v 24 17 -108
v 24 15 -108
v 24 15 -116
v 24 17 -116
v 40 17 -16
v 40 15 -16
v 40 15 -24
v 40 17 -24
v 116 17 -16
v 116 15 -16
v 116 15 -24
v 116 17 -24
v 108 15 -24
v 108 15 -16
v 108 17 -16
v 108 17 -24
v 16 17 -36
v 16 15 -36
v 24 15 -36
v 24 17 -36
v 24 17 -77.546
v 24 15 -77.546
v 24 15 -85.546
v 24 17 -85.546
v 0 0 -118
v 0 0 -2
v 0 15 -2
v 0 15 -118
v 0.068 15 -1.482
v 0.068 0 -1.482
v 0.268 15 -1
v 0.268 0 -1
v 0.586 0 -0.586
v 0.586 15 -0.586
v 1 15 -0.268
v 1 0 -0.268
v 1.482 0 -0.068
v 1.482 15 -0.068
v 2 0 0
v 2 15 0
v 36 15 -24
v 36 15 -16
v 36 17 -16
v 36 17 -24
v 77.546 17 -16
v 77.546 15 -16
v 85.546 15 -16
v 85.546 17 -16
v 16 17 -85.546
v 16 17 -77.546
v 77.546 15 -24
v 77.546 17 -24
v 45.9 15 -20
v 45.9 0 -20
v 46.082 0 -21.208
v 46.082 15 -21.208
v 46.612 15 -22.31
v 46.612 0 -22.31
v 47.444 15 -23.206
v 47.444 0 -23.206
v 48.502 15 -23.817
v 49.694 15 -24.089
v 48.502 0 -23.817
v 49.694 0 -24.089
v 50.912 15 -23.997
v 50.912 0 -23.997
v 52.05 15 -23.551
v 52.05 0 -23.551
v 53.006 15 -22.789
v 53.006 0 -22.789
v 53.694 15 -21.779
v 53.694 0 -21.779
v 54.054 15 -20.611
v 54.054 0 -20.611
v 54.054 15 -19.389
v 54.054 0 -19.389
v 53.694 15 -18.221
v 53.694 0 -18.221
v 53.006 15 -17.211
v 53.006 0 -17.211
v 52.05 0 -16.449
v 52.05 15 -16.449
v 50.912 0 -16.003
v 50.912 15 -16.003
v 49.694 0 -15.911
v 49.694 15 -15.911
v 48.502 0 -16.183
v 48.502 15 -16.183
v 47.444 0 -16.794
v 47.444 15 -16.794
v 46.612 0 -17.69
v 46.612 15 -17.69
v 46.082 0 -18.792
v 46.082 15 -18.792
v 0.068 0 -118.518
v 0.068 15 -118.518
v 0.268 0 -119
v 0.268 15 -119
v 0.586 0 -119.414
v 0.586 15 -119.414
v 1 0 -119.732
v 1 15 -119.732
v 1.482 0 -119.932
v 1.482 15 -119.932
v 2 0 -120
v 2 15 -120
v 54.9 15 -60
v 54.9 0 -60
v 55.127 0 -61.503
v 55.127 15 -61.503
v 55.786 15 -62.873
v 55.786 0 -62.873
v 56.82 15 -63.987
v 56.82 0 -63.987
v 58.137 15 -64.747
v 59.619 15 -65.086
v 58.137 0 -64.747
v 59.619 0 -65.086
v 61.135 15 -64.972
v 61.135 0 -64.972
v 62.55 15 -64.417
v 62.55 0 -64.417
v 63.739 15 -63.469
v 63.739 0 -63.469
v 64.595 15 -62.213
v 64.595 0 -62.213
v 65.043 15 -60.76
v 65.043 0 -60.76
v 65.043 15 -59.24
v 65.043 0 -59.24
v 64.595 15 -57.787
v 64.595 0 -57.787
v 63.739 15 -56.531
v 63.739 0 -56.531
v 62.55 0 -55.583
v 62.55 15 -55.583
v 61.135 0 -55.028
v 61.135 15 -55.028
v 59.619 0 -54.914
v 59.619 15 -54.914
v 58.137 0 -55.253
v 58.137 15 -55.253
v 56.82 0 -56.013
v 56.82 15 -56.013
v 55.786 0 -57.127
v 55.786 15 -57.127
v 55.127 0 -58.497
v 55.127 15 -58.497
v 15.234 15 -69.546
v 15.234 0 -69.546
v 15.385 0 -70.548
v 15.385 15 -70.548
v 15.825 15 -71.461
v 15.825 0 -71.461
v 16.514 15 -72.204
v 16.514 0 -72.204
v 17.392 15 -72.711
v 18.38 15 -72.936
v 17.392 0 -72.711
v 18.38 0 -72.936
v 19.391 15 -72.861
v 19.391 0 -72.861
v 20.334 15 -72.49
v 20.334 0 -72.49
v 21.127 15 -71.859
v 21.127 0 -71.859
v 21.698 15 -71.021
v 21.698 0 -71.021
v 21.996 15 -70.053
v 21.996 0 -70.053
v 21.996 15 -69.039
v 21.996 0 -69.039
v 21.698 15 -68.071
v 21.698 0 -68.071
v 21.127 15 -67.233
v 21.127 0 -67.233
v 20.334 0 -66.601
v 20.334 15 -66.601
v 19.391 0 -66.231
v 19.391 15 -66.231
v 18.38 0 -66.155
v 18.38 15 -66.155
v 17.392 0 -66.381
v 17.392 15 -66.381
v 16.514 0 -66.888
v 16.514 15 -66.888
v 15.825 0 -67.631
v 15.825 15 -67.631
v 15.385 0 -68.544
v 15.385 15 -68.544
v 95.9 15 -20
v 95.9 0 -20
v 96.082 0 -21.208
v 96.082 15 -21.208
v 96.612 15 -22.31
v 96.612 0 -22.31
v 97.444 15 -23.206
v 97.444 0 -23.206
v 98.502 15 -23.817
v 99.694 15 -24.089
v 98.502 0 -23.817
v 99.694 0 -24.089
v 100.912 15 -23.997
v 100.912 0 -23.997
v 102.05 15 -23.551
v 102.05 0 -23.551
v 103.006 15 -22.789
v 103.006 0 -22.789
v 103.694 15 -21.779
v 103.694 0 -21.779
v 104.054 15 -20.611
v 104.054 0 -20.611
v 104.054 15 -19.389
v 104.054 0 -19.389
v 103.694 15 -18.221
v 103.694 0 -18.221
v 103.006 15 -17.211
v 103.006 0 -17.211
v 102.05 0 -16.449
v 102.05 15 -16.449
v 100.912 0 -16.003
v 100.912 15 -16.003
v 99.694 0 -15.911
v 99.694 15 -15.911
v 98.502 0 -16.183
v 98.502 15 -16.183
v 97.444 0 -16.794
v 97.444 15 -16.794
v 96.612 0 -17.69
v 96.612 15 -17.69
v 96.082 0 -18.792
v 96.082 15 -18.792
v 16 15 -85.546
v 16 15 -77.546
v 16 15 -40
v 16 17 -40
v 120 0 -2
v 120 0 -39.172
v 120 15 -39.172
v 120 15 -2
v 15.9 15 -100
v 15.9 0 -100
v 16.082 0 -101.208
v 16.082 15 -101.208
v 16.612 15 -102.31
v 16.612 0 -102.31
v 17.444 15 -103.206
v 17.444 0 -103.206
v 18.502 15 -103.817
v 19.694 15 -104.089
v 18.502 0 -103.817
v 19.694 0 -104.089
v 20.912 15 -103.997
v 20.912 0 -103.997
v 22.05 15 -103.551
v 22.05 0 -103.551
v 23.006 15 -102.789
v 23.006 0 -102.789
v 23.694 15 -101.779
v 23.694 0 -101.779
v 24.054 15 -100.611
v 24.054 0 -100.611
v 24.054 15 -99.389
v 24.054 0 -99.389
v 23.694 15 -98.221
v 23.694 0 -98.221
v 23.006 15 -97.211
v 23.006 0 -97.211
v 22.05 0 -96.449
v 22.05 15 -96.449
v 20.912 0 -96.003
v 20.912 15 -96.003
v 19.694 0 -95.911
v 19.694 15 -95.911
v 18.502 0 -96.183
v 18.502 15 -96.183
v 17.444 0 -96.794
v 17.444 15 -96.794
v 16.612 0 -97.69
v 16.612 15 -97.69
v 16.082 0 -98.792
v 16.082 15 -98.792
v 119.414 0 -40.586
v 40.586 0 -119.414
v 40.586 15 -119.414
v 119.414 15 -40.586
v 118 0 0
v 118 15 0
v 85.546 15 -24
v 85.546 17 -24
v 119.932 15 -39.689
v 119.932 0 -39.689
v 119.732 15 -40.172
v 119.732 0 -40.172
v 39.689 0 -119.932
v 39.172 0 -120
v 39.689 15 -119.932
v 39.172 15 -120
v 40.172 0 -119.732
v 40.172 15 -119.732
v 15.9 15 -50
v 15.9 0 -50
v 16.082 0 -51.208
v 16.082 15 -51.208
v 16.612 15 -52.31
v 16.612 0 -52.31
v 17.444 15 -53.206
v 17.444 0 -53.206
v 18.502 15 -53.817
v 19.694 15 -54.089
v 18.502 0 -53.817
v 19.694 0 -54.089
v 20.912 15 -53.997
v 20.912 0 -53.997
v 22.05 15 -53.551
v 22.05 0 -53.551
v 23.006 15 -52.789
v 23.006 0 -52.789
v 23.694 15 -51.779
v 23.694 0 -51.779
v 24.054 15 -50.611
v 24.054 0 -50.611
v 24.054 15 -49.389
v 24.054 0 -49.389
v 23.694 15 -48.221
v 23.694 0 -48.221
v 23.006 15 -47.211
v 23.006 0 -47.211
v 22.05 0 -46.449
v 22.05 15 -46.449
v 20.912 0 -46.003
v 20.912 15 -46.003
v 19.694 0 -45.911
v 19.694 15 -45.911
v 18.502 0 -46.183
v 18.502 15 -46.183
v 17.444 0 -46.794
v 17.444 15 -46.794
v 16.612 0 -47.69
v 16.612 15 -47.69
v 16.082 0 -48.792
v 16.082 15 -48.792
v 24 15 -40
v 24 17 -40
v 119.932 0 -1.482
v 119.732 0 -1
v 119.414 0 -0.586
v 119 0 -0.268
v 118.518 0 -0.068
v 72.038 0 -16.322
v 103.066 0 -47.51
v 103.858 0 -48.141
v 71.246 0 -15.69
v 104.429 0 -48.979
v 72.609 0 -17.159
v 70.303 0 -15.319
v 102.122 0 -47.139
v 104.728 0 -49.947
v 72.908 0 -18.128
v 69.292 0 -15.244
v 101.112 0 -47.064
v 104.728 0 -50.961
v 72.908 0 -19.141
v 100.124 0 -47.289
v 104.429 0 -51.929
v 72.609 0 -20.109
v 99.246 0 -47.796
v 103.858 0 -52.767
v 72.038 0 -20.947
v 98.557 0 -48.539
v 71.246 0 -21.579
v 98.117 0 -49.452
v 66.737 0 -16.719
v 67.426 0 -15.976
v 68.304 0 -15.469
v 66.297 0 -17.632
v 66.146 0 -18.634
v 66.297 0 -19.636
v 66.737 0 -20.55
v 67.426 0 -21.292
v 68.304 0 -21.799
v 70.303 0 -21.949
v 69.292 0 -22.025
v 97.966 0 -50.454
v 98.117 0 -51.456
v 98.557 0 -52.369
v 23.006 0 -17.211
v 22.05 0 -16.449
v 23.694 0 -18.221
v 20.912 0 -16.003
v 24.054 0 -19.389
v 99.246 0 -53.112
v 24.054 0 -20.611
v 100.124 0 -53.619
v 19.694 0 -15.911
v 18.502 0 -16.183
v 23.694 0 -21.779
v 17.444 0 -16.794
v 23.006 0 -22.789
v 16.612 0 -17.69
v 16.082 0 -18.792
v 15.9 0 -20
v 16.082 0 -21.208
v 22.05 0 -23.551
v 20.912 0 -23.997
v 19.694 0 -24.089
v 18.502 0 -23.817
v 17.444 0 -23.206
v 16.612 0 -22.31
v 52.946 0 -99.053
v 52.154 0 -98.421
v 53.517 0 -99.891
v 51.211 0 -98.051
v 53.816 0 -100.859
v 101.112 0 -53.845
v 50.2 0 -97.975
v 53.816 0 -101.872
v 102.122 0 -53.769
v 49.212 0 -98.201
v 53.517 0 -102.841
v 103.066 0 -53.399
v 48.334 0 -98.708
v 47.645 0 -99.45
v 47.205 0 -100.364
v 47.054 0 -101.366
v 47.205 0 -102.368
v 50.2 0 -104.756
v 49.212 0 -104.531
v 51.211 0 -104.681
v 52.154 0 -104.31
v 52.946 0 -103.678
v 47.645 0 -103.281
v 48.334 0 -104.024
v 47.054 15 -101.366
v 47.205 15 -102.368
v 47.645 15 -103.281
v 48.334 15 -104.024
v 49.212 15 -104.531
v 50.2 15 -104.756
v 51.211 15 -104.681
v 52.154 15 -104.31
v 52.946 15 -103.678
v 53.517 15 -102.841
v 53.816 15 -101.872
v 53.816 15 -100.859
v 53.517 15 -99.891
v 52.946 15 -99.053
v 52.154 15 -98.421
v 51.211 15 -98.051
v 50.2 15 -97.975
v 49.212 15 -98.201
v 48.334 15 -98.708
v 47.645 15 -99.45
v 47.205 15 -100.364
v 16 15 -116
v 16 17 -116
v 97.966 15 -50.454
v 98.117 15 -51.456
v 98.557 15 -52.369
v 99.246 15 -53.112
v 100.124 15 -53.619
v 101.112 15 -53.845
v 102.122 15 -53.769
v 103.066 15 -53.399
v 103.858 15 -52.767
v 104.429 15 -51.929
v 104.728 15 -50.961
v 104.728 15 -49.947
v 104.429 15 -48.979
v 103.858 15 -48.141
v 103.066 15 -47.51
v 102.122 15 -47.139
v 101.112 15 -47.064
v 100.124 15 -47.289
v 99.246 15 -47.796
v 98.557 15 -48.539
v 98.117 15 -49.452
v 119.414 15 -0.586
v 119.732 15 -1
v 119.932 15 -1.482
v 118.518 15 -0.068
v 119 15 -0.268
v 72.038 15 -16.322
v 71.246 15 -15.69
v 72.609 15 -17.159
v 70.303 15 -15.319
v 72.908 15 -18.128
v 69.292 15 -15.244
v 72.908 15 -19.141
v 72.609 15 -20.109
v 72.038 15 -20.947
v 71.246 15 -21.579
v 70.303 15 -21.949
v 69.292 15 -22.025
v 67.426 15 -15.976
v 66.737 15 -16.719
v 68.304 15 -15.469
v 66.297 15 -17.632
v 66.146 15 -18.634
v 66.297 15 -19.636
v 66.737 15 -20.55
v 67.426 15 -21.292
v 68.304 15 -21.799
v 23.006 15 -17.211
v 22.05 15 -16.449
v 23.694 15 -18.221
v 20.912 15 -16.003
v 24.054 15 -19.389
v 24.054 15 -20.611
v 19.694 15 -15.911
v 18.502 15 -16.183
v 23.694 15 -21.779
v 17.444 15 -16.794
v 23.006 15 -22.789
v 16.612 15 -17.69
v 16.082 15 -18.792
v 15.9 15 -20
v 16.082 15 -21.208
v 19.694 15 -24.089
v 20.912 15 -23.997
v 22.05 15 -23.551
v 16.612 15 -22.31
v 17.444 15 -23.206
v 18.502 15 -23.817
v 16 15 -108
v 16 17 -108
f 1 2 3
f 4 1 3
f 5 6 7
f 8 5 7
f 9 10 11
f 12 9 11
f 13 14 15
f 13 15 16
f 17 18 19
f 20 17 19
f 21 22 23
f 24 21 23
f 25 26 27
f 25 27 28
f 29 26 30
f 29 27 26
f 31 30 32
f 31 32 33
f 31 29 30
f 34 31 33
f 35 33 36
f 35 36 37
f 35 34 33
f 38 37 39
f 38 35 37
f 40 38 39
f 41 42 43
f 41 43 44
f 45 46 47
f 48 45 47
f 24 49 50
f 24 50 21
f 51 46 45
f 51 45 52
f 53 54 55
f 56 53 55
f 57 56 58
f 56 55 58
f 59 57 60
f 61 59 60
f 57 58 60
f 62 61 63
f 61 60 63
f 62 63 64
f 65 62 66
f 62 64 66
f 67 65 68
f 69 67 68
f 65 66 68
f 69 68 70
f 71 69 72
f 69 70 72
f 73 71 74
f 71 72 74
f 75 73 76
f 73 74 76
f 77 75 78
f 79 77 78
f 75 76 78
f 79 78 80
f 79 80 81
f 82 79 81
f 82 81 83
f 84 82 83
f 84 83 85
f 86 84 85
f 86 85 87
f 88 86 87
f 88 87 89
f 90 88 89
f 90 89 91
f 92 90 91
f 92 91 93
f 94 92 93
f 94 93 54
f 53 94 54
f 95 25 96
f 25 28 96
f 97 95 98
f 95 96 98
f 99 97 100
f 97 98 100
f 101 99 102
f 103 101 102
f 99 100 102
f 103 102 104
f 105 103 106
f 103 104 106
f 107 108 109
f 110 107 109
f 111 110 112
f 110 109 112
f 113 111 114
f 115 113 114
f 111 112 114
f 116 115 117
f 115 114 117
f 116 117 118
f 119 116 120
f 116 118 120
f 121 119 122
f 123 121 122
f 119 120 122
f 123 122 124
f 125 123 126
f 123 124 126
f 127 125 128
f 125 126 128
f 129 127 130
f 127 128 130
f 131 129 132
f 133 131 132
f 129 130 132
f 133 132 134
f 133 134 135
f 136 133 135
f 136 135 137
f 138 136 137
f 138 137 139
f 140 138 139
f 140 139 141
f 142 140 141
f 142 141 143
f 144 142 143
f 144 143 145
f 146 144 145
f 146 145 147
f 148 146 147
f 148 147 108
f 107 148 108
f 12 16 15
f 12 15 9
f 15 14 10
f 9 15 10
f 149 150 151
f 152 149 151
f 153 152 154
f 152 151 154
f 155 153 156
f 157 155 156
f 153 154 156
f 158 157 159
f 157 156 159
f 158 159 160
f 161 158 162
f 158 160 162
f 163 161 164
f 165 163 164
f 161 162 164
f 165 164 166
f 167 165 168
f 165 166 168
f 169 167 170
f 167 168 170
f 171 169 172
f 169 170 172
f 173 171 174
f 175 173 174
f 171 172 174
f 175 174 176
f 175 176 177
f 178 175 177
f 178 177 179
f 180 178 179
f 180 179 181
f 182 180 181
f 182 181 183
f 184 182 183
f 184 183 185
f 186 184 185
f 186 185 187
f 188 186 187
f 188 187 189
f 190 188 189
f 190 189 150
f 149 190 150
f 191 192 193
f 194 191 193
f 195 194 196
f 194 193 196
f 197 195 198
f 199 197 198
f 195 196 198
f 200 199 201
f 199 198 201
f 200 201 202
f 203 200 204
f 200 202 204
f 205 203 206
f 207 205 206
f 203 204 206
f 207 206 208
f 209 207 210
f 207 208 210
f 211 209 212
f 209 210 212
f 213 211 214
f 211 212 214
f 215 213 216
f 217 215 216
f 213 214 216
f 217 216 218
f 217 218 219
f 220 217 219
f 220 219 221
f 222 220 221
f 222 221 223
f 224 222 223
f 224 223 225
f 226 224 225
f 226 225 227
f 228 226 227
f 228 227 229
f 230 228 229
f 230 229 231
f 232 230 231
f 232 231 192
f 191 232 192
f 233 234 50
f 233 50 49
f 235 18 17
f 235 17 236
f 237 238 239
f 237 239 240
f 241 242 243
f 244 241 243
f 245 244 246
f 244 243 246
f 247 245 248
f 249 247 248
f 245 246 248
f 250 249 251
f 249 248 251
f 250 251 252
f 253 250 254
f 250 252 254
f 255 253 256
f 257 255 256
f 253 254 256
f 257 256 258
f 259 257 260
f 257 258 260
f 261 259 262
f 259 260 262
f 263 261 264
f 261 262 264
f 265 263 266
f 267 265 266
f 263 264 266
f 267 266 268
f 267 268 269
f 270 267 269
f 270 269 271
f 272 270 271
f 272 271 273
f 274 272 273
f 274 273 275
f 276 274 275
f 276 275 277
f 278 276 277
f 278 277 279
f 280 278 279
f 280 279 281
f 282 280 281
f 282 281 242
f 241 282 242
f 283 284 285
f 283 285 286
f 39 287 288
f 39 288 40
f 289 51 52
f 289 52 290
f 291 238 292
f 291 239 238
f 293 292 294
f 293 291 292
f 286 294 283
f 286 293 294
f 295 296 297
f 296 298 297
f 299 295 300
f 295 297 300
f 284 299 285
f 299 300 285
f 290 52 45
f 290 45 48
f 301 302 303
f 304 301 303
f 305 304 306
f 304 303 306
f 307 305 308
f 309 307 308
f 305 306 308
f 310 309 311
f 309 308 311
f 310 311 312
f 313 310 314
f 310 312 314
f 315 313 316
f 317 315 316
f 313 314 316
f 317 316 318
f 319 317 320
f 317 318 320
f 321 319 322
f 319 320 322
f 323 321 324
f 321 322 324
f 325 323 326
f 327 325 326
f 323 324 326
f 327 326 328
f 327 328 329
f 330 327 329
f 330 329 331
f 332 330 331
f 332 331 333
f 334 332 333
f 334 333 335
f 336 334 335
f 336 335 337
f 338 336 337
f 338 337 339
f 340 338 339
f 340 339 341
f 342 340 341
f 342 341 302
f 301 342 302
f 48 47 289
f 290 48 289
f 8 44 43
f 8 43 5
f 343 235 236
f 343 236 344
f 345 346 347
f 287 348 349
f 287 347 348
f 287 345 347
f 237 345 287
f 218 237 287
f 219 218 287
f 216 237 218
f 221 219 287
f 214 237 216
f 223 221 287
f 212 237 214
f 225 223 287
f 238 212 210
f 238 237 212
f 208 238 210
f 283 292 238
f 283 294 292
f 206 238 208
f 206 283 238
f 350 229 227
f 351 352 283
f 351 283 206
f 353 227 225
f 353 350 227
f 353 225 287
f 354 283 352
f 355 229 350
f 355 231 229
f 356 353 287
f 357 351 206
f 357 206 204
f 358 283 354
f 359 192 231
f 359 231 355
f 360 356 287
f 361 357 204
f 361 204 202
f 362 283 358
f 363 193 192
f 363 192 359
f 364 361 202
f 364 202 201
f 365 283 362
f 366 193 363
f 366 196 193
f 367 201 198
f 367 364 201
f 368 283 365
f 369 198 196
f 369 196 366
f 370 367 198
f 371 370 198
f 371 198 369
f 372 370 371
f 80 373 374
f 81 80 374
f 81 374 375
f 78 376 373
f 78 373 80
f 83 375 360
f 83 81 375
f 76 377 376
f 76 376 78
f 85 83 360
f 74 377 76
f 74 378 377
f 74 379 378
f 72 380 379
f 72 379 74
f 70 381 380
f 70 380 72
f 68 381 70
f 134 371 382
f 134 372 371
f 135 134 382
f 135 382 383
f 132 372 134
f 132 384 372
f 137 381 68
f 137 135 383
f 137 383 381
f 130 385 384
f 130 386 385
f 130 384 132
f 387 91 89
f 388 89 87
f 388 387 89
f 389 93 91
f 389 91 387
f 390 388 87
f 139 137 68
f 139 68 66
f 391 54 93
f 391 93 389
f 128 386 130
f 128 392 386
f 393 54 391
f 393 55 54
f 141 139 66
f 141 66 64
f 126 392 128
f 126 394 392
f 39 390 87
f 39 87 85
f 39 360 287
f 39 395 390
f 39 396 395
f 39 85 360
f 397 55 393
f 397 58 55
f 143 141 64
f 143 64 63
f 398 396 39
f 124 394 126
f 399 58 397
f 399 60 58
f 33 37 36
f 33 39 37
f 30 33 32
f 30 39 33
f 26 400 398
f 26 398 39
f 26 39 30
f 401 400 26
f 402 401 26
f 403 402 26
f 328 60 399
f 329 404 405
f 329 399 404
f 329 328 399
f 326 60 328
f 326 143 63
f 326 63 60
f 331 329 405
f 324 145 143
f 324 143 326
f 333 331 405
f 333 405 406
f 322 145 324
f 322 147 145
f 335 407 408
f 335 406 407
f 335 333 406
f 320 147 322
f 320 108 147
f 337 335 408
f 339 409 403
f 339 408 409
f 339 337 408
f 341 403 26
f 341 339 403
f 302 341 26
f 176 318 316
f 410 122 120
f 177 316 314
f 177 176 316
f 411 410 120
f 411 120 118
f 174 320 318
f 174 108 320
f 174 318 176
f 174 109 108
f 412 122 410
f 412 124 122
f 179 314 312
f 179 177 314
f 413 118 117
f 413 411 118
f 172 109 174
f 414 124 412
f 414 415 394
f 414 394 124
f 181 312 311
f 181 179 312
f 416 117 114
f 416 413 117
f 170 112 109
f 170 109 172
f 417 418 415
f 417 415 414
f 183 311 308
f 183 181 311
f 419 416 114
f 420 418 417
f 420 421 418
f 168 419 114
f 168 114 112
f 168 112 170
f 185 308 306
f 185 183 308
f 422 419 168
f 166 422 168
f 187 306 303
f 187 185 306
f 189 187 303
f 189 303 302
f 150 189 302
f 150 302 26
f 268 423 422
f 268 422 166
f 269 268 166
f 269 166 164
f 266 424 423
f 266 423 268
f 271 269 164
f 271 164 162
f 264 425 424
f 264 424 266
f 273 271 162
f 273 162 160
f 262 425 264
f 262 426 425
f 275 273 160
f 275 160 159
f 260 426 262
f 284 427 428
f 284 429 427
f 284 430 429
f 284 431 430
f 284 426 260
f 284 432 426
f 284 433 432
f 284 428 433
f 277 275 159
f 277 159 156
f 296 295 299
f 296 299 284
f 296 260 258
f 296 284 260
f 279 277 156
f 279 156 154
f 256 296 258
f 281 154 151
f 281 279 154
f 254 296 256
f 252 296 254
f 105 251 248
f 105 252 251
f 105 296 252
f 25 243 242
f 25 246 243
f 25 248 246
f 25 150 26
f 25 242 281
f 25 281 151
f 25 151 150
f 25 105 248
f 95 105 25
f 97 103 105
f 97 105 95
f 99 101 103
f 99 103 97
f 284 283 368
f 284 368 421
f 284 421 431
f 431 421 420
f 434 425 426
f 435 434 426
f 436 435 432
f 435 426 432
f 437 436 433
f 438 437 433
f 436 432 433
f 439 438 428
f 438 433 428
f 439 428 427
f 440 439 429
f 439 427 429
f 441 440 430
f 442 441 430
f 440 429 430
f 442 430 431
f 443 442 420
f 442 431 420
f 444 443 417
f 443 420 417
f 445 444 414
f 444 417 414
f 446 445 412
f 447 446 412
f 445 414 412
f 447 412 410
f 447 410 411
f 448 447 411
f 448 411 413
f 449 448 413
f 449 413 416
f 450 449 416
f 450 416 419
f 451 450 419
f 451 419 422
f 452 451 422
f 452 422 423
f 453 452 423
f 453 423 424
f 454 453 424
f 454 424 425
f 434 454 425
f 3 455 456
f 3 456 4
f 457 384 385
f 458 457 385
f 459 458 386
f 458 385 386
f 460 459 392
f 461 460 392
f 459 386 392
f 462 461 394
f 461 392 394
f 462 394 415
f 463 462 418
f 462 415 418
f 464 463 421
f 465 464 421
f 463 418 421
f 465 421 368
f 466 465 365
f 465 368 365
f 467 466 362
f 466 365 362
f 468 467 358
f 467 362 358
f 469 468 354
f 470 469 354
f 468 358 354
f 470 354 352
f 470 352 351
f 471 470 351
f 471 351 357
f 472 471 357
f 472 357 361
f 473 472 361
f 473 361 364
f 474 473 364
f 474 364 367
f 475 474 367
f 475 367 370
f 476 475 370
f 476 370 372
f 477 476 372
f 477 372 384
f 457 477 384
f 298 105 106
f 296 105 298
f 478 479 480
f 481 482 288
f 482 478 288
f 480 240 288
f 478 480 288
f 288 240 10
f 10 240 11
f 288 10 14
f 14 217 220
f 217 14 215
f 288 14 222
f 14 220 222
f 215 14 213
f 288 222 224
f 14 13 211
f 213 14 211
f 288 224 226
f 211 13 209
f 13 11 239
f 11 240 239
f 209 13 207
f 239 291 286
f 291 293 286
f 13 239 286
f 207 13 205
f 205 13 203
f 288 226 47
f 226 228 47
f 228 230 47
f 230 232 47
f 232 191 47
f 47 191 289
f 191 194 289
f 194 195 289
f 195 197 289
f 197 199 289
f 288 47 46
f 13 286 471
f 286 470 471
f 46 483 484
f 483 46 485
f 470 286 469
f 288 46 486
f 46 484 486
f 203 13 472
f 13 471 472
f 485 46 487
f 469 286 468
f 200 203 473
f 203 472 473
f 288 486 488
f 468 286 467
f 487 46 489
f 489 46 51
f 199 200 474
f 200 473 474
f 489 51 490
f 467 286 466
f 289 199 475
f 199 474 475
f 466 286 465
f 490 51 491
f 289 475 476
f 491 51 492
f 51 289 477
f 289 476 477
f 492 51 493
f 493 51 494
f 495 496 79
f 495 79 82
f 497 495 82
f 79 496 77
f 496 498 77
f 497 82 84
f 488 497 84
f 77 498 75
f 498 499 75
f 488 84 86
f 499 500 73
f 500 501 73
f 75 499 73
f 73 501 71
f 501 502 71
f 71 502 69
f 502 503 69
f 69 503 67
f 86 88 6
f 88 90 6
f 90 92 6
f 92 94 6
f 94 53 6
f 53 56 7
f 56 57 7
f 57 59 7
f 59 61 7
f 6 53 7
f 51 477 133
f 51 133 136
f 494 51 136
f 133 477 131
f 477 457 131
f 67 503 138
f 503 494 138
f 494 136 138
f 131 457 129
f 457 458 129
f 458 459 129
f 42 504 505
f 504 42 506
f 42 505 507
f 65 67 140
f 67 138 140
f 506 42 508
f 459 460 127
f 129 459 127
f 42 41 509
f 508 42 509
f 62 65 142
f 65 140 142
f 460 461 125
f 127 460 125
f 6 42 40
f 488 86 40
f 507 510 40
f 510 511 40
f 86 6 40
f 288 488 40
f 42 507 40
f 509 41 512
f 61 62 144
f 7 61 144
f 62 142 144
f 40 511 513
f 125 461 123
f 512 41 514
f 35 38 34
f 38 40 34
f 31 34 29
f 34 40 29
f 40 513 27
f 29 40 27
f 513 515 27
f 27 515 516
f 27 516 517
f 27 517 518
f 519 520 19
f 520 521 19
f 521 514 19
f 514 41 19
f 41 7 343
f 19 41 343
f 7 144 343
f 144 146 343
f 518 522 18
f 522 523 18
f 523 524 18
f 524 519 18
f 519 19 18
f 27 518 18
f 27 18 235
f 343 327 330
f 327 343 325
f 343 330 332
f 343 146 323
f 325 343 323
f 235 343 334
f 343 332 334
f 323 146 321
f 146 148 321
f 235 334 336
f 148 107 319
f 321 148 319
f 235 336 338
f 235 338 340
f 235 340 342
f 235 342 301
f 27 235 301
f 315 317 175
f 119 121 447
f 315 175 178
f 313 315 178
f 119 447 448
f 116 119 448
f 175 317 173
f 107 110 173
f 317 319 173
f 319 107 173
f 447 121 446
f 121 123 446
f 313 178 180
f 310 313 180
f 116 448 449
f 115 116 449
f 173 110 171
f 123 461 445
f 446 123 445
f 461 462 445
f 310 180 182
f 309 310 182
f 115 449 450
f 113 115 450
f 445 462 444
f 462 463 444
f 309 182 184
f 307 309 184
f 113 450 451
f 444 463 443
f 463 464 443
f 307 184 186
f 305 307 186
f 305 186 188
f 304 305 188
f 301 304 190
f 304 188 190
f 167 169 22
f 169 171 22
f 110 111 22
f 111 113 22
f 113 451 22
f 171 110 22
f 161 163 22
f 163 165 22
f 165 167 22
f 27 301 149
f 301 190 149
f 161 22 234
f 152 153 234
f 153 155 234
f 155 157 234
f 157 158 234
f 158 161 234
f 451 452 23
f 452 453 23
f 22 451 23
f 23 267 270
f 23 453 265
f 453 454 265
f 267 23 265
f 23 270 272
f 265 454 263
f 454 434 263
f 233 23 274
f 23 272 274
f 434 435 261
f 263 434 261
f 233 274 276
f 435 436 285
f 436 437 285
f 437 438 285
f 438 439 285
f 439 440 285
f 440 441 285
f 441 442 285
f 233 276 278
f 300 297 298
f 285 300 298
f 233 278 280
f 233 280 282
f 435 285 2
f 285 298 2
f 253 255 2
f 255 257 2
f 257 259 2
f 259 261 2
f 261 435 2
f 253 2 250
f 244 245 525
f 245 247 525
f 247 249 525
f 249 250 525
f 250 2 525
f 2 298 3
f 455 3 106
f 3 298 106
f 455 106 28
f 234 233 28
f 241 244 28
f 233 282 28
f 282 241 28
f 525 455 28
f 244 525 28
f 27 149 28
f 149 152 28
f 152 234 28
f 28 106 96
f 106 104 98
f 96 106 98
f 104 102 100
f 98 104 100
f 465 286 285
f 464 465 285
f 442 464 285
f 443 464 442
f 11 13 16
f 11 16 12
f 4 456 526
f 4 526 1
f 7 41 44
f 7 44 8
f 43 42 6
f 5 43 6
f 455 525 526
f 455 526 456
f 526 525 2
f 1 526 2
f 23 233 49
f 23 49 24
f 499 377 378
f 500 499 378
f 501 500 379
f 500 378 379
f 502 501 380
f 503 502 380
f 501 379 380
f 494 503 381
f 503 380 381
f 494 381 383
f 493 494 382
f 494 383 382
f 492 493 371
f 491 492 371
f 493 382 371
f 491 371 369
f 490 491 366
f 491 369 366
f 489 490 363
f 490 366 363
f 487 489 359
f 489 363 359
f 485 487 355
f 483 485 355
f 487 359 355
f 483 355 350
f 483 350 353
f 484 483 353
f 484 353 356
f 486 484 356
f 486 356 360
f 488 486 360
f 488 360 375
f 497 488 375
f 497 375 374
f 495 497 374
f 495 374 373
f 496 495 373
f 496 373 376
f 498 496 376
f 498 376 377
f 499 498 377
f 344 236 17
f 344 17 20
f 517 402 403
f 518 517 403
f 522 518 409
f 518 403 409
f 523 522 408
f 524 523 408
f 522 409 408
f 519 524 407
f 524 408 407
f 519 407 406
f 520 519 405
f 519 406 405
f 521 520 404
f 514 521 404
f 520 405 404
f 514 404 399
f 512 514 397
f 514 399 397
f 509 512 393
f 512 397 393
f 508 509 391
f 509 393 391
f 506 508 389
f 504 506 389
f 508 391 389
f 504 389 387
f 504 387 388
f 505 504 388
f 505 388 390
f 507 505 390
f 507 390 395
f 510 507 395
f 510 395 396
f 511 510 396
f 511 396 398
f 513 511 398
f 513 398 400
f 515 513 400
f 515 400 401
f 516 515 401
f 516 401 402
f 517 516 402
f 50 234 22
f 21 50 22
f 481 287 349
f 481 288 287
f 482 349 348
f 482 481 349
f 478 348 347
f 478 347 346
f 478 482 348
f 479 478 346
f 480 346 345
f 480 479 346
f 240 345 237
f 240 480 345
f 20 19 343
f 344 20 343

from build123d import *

# Parameters (mm, degrees)
EXTRUDE_1_DEPTH             = 15
HOLE_WIZARD_M121_D          = 10.2
HOLE_WIZARD_M121_DEPTH      = 15
HOLE_WIZARD_M81_D           = 6.8
HOLE_WIZARD_M81_DEPTH       = 15
HOLE_WIZARD_8_2_8_2_1_D     = 8.2
HOLE_WIZARD_8_2_8_2_1_DEPTH = 15
SKETCH_9_W                  = 8
SKETCH_9_H                  = 8
SKETCH_9_H_2                = 4
SKETCH_9_W_2                = 4
EXTRUDE_2_DEPTH             = 2
FILLET_1_R                  = 2


with BuildPart() as part:
    # Эскиз1 → Бобышка-Вытянуть1 (new body)
    with BuildSketch(Plane(origin=(0, 0, 0), x_dir=(1, 0, 0), z_dir=(0, 1, 0))):
        Polygon((0, 0), (0, 120), (40, 120), (120, 40), (120, 0), align=None)
    extrude(amount=EXTRUDE_1_DEPTH)

    # Отверстие обработанное метчиком M121
    with Locations(Plane(origin=(0, 15, 0), x_dir=(1, 0, 0), z_dir=(0, 1, 0))):
        with Locations((60, 60)):
            Hole(HOLE_WIZARD_M121_D / 2, depth=HOLE_WIZARD_M121_DEPTH)

    # Отверстие обработанное метчиком M81
    with Locations(Plane(origin=(0, 15, 0), x_dir=(1, 0, 0), z_dir=(0, 1, 0))):
        with Locations((50.454058454, 101.365746699), (101.365746699, 50.454058454), (69.545941546, 18.634253301), (18.634253301, 69.545941546)):
            Hole(HOLE_WIZARD_M81_D / 2, depth=HOLE_WIZARD_M81_DEPTH)

    # Диаметр отверстия Ø8.2 (8.2)1
    with Locations(Plane(origin=(0, 15, 0), x_dir=(1, 0, 0), z_dir=(0, 1, 0))):
        with Locations((20, 100), (20, 50), (20, 20), (50, 20), (100, 20)):
            Hole(HOLE_WIZARD_8_2_8_2_1_D / 2, depth=HOLE_WIZARD_8_2_8_2_1_DEPTH)

    # Эскиз9 → Бобышка-Вытянуть2 (add)
    with BuildSketch(Plane(origin=(0, 15, 0), x_dir=(1, 0, 0), z_dir=(0, 1, 0))):
        with Locations((20, 112)):
            Rectangle(SKETCH_9_W, SKETCH_9_H)
        with Locations((20, 81.545941546)):
            Rectangle(SKETCH_9_W, SKETCH_9_H)
        with Locations((20, 38)):
            Rectangle(SKETCH_9_W, SKETCH_9_H_2)
        with Locations((38, 20)):
            Rectangle(SKETCH_9_W_2, SKETCH_9_H)
        with Locations((81.545941546, 20)):
            Rectangle(SKETCH_9_W, SKETCH_9_H)
        with Locations((112, 20)):
            Rectangle(SKETCH_9_W, SKETCH_9_H)
    extrude(amount=EXTRUDE_2_DEPTH)

    # Скругление1
    fillet_1_edges = [part.edges().sort_by_distance(p)[0] for p in [
        (0, 7.5, 0),
        (0, 7.5, -120),
        (40, 7.5, -120),
        (120, 7.5, -40),
        (120, 7.5, 0),
    ]]
    fillet(fillet_1_edges, radius=FILLET_1_R)


solid = part.part
